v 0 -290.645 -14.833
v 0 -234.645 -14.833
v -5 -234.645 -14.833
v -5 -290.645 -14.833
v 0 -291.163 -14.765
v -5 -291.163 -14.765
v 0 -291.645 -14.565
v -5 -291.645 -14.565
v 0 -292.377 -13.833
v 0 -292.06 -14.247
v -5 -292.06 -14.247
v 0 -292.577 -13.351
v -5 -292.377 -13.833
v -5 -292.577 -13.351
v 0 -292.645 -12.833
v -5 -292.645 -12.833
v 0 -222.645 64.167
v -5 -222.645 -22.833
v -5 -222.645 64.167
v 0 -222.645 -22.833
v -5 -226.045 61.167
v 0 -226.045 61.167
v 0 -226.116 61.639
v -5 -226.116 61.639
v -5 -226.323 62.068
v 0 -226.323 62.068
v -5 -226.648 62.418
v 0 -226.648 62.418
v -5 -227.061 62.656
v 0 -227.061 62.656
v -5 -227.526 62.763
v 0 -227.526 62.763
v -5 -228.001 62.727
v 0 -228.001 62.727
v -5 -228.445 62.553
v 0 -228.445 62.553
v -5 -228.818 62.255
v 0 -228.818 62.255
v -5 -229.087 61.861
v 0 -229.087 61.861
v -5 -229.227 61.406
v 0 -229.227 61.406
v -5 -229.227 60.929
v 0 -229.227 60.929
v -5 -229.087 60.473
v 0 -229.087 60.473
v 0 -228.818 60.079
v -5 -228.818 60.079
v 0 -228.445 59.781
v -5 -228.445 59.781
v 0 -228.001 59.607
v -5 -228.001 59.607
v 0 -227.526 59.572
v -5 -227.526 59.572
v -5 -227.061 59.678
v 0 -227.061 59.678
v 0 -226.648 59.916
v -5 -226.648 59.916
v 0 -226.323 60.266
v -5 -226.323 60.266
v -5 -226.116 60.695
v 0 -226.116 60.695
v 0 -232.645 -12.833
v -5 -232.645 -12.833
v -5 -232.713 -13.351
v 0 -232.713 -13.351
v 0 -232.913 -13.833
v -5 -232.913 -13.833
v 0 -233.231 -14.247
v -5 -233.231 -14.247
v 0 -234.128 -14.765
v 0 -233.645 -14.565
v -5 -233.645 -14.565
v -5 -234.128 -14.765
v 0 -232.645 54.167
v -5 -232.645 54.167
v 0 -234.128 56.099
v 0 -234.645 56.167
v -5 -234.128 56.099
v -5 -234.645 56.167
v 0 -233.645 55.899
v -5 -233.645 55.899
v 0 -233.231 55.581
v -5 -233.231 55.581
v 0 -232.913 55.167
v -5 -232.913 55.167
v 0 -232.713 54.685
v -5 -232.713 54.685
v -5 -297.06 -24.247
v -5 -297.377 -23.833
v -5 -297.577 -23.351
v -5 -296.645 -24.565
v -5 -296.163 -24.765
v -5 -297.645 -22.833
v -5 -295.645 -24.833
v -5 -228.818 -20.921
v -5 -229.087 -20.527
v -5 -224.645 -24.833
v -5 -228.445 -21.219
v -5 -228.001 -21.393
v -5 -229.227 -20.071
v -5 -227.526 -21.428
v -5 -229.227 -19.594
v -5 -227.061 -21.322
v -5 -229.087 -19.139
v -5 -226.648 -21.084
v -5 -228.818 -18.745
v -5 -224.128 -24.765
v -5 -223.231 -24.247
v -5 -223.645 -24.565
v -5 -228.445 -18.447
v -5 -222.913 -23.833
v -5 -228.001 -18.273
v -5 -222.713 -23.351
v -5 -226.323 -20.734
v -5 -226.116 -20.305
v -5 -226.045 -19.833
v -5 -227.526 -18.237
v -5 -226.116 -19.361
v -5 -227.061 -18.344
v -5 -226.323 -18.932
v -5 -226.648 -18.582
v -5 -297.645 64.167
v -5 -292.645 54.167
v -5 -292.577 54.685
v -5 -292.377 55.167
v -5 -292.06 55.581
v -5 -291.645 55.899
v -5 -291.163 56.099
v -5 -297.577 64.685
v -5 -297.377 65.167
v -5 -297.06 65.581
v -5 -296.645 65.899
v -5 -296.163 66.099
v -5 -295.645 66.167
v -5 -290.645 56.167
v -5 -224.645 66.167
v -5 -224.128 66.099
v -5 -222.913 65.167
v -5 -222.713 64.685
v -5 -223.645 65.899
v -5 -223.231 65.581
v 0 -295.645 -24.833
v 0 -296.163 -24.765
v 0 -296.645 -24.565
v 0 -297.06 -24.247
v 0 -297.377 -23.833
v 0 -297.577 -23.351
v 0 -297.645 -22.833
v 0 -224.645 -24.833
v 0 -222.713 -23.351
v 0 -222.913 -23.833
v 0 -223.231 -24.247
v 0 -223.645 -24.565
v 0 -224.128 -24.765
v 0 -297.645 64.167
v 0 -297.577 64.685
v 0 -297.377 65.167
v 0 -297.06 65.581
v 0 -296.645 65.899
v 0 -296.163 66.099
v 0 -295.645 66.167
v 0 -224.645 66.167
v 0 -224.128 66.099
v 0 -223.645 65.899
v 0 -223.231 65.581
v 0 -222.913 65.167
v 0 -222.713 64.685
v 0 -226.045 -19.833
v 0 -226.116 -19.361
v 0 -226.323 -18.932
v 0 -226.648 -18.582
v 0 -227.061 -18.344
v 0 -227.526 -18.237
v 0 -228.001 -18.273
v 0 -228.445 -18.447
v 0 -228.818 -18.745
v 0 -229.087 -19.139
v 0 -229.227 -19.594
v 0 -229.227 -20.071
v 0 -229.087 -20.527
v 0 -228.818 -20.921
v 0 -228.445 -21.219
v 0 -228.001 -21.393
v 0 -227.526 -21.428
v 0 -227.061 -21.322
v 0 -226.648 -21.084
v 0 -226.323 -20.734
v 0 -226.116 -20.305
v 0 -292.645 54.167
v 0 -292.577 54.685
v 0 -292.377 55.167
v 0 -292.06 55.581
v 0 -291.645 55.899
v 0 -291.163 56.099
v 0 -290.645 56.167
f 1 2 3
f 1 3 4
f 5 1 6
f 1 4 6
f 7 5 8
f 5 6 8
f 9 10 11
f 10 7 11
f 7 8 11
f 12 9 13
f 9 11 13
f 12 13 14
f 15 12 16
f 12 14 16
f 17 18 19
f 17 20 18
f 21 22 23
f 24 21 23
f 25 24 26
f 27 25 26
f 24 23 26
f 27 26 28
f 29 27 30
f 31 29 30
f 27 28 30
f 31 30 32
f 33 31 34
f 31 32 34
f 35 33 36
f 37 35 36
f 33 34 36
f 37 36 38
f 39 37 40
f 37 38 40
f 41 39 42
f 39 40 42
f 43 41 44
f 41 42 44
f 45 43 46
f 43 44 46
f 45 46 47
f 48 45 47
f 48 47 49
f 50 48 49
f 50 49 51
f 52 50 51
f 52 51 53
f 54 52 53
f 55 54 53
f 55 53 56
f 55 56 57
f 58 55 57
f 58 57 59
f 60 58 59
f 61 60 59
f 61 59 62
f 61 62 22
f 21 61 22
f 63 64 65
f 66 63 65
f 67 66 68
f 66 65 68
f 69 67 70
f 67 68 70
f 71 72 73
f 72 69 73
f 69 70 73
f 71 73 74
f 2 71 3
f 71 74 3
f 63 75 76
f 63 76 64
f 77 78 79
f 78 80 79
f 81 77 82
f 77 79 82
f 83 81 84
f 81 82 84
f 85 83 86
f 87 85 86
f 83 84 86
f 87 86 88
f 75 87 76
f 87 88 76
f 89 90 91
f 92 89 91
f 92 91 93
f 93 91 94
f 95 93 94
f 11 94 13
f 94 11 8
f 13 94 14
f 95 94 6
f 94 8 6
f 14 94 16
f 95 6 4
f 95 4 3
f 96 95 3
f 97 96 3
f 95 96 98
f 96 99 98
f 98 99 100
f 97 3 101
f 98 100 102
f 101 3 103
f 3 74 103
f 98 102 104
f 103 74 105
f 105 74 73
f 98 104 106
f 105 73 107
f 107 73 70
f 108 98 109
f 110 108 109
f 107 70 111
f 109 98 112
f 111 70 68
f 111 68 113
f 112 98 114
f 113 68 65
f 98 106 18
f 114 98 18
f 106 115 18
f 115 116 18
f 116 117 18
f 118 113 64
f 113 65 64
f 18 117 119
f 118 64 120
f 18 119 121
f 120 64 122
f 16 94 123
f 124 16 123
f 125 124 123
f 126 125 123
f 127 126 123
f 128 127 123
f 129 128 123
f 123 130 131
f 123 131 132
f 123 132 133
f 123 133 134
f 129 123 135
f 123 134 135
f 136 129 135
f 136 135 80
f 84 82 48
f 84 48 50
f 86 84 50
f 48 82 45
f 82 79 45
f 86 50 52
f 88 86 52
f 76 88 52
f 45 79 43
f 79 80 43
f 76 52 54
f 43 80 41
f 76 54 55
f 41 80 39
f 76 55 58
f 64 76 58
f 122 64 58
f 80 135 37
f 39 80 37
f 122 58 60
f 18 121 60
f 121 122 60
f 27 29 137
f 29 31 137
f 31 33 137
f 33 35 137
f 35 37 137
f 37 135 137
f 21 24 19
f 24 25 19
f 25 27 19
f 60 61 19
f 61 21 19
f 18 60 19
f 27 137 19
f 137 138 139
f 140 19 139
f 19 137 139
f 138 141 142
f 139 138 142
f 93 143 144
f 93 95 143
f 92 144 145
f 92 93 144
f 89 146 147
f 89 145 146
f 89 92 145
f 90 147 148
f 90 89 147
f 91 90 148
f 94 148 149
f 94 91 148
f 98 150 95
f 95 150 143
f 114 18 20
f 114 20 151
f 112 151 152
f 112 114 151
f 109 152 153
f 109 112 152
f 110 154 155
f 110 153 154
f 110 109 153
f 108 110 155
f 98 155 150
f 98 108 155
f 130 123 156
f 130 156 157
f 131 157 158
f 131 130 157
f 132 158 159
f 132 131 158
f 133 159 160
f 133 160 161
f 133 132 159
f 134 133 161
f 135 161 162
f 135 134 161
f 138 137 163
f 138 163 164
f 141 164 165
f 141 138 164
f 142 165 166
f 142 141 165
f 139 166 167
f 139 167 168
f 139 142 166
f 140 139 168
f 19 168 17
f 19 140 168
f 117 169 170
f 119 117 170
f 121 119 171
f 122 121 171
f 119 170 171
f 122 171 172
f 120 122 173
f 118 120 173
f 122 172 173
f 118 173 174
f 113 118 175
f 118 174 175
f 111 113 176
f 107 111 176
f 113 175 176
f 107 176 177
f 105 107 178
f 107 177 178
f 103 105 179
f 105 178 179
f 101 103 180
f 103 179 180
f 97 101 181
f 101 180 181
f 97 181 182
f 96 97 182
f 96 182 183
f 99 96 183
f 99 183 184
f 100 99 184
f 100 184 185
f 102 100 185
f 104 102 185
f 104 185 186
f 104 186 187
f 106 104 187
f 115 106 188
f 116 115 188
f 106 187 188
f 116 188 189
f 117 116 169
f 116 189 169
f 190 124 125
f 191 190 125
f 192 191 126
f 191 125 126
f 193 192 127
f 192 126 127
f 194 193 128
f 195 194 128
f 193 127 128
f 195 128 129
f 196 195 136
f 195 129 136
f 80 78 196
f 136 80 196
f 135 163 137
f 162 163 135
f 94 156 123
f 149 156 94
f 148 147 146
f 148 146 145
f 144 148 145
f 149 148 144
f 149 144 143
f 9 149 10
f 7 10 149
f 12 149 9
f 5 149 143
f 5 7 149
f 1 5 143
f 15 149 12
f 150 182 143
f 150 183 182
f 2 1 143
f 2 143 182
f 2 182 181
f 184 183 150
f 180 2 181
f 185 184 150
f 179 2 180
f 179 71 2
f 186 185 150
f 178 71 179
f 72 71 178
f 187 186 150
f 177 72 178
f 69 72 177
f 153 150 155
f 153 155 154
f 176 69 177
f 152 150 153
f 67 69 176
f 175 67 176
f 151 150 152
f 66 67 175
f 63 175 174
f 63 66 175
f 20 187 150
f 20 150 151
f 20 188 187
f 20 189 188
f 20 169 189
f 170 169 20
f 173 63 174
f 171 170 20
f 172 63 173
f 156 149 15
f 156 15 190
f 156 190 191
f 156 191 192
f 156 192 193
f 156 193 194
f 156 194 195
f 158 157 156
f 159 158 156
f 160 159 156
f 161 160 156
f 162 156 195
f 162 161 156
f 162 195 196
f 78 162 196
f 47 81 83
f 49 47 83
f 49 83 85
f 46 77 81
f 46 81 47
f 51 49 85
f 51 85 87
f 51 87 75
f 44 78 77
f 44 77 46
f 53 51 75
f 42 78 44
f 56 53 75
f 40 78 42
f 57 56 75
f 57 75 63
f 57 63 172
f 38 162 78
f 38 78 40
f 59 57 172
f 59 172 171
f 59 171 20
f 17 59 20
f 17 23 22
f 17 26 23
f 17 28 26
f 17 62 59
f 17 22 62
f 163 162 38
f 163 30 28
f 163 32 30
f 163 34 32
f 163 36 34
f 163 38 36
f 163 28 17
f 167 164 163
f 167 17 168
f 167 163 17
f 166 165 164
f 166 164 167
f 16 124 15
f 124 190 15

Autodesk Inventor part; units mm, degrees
ref_plane "YZ Plane" through (0, 0, 0) normal (1, 0, 0) x (0, 1, 0)
ref_plane "XZ Plane" through (0, 0, 0) normal (0, 1, 0) x (-1, 0, 0)
ref_plane "XY Plane" through (0, 0, 0) normal (0, 0, 1) x (1, 0, 0)
sketch "スケッチ1" plane through (0, 0, 0) normal (1, 0, 0) x (0, 1, 0)
  line L0 (-222.6453, 335.6671) -> (407.3547, 335.6671)
  line L1 (407.3547, 335.6671) -> (407.3547, -294.3329)
  line L2 (407.3547, -294.3329) -> (-222.6453, -294.3329)
  line L3 (-222.6453, -294.3329) -> (-222.6453, 335.6671)
  line L4 (-222.6453, 335.6671) -> (407.3547, -294.3329) construction
  line L5 (407.3547, 335.6671) -> (-222.6453, -294.3329) construction
  line L6 (-202.6453, 238.6671) -> (-202.6453, -181.3329)
  line L7 (-202.6453, -181.3329) -> (-222.6453, -181.3329)
  line L8 (-222.6453, -181.3329) -> (-222.6453, 230.6671)
  line L9 (334.3547, 335.6671) -> (-149.6453, 335.6671)
  line L10 (-149.6453, 335.6671) -> (-149.6453, 315.6671)
  line L11 (-149.6453, 315.6671) -> (334.3547, 315.6671)
  line L12 (334.3547, 315.6671) -> (334.3547, 335.6671)
  line L13 (-202.6453, 238.6671) -> (-202.6453, 335.6671)
  line L14 (92.3547, 20.6671) -> (-864.2426, 20.6671)
  circle A0 centre (92.3547, 20.6671) radius 400
  line L15 (-237.6453, 45.6671) -> (-287.6453, 45.6671)
  line L16 (-287.6453, 45.6671) -> (-287.6453, -4.3329)
  line L17 (-287.6453, -4.3329) -> (-237.6453, -4.3329)
  line L18 (-237.6453, -4.3329) -> (-237.6453, 45.6671)
  line L19 (92.3547, 20.6671) -> (92.3547, -610.2507)
  line L20 (-222.6453, 60.6671) -> (-302.6453, 60.6671) construction
  line L21 (-302.6453, 60.6671) -> (-302.6453, 50.6671)
  line L22 (-302.6453, 50.6671) -> (-222.6453, 50.6671)
  line L23 (-222.6453, 50.6671) -> (-222.6453, 60.6671)
  line L24 (-302.6453, 50.6671) -> (-292.6453, 50.6671)
  line L25 (-292.6453, 50.6671) -> (-292.6453, 20.6671)
  line L26 (-292.6453, 20.6671) -> (-302.6453, 20.6671)
  line L27 (-302.6453, 20.6671) -> (-302.6453, 50.6671)
  line L28 (387.3547, 222.6671) -> (407.3547, 222.6671)
  line L29 (407.3547, 222.6671) -> (407.3547, -181.3329)
  line L30 (407.3547, -181.3329) -> (387.3547, -181.3329)
  line L31 (387.3547, -181.3329) -> (387.3547, 222.6671)
  line L32 (-129.8635, -294.3329) -> (334.3547, -294.3329)
  line L33 (334.3547, -294.3329) -> (334.3547, -274.3329)
  line L34 (334.3547, -274.3329) -> (-149.6453, -274.3329)
  line L35 (407.3547, 335.6671) -> (92.3547, 20.6671)
  line L36 (407.3547, 145.6671) -> (407.3547, 165.6671)
  circle A1 centre (604.3547, 20.6671) radius 122.5
  circle A2 centre (272.0452, 20.6671) radius 600
  circle A3 centre (634.0363, 20.6671) radius 200
  circle A4 centre (92.3547, 20.6671) radius 10
  arc A5 (92.3547, 170.6671) -> (92.3547, -129.3329) centre (92.3547, 20.6671) ccw
  arc A6 (92.3547, 160.6671) -> (92.3547, -119.3329) centre (92.3547, 20.6671) ccw
  line L37 (-53.9724, 53.6575) -> (-44.2173, 51.4581)
  line L38 (-45.2265, 58.3488) -> (-48.0856, 45.6671)
  line L39 (-48.0856, 45.6671) -> (-52.9632, 46.7668)
  line L40 (-52.9632, 46.7668) -> (-50.104, 59.4485)
  line L41 (-50.104, 59.4485) -> (-45.2265, 58.3488)
  arc A7 (63.2246, 162.7109) -> (63.2246, -121.3767) centre (92.3547, 20.6671) ccw
  circle A8 centre (-59.1356, 59.9471) radius 6.5
  circle A9 centre (-36.6854, 54.8855) radius 6.5 construction
  circle A10 centre (-36.6854, 54.8855) radius 1.5 construction
  circle A11 centre (-59.1356, 59.9471) radius 1.5
  line L42 (62.1879, 43.1671) -> (-81.7815, 43.1671)
  line L43 (-81.7815, 43.1671) -> (-81.7815, 28.1671)
  line L44 (-81.7815, 28.1671) -> (62.1879, 28.1671)
  line L45 (62.1879, 28.1671) -> (62.1879, 43.1671)
  line L46 (-53.9724, -12.3232) -> (-44.2173, -10.1239)
  line L47 (-45.2265, -17.0146) -> (-48.0856, -4.3329)
  line L48 (-48.0856, -4.3329) -> (-52.9632, -5.4326)
  line L49 (-52.9632, -5.4326) -> (-50.104, -18.1142)
  line L50 (-50.104, -18.1142) -> (-45.2265, -17.0146)
  circle A12 centre (-59.1356, -18.6128) radius 6.5
  circle A13 centre (-36.6854, -13.5513) radius 6.5 construction
  circle A14 centre (-36.6854, -13.5513) radius 1.5 construction
  circle A15 centre (-59.1356, -18.6128) radius 1.5
  line L51 (62.1879, -1.8329) -> (-81.7815, -1.8329)
  line L52 (-81.7815, -1.8329) -> (-81.7815, 13.1671)
  line L53 (-81.7815, 13.1671) -> (62.1879, 13.1671)
  line L54 (62.1879, 13.1671) -> (62.1879, -1.8329)
  line L55 (-59.1356, 59.9471) -> (-36.6854, 54.8855) construction
  line L56 (-36.6854, 54.8855) -> (-37.2352, 52.4467) construction
  line L57 (-37.2352, 52.4467) -> (-59.6855, 57.5083) construction
  line L58 (-59.6855, 57.5083) -> (-59.1356, 59.9471) construction
  line L59 (-36.6854, 54.8855) -> (-59.1356, 59.9471) construction
  line L60 (-59.1356, 59.9471) -> (-58.5858, 62.3858) construction
  line L61 (-58.5858, 62.3858) -> (-36.1355, 57.3243) construction
  line L62 (-36.1355, 57.3243) -> (-36.6854, 54.8855) construction
  line L63 (-36.1355, 57.3243) -> (-37.2352, 52.4467) construction
  line L64 (-37.2352, 52.4467) -> (-25.529, 49.8075) construction
  line L65 (-25.529, 49.8075) -> (-24.4294, 54.6851) construction
  line L66 (-24.4294, 54.6851) -> (-36.1355, 57.3243) construction
  line L67 (-58.5858, 62.3858) -> (-59.6855, 57.5083) construction
  line L68 (-59.6855, 57.5083) -> (-71.3917, 60.1475) construction
  line L69 (-71.3917, 60.1475) -> (-70.292, 65.0251) construction
  line L70 (-70.292, 65.0251) -> (-58.5858, 62.3858) construction
  line L71 (-62.9135, 65.9243) -> (-36.5865, 59.9887)
  line L72 (-36.5865, 59.9887) -> (-39.8855, 45.356)
  line L73 (-39.8855, 45.356) -> (-66.2126, 51.2916)
  line L74 (-66.2126, 51.2916) -> (-62.9135, 65.9243)
  line L75 (-62.9135, -24.5901) -> (-36.5865, -18.6545)
  line L76 (-36.5865, -18.6545) -> (-39.8855, -4.0218)
  line L77 (-39.8855, -4.0218) -> (-66.2126, -9.9574)
  line L78 (-66.2126, -9.9574) -> (-62.9135, -24.5901)
  arc A16 (-39.8855, 45.356) -> (-39.8855, -4.0218) centre (92.3547, 20.6671) ccw
  arc A17 (-66.2126, 51.2916) -> (-66.2126, -9.9574) centre (92.3547, 20.6671) ccw
  circle A18 centre (-60.1453, 35.6671) radius 1.25
  line L79 (-52.6453, 20.6671) -> (-52.6453, 95.4053)
  circle A19 centre (-45.1453, 35.6671) radius 1.25
  circle A20 centre (-60.1453, 5.6671) radius 1.25
  circle A21 centre (-45.1453, 5.6671) radius 1.25
  line L80 (92.3547, 20.6671) -> (92.3547, 160.6671)
  line L81 (92.3547, 20.6671) -> (44.4719, 152.2241)
  line L82 (92.3547, 160.6671) -> (92.3547, 170.6671)
  line L83 (-45.2298, 46.5609) -> (-41.9308, 61.1936)
  line L84 (-45.2298, -5.2267) -> (-41.9308, -19.8594)
  circle A22 centre (92.3547, 20.6671) radius 20
  line L85 (387.3547, 65.6671) -> (-202.6453, 65.6671)
  line L86 (-202.6453, 65.6671) -> (-202.6453, 45.6671)
  line L87 (-202.6453, 45.6671) -> (387.3547, 45.6671)
  line L88 (387.3547, 45.6671) -> (387.3547, 65.6671)
  line L89 (52.3547, 315.6671) -> (42.3547, 315.6671)
  line L90 (42.3547, 315.6671) -> (42.3547, 65.6671)
  line L91 (42.3547, 65.6671) -> (52.3547, 65.6671)
  line L92 (52.3547, 65.6671) -> (52.3547, 315.6671)
  line L93 (387.3547, -24.3329) -> (-202.6453, -24.3329)
  line L94 (-202.6453, -4.3329) -> (387.3547, -4.3329)
  line L95 (42.3547, -274.3329) -> (42.3547, -24.3329)
  line L96 (52.3547, -24.3329) -> (52.3547, -274.3329)
  line L97 (52.3547, 65.6671) -> (52.3547, -24.3329)
  line L98 (132.3547, 65.6671) -> (132.3547, -24.3329)
  circle A23 centre (112.3547, 55.6671) radius 1.5
  circle A24 centre (72.3547, 55.6671) radius 1.5
  circle A25 centre (112.3547, -14.3329) radius 1.5
  circle A26 centre (72.3547, -14.3329) radius 1.5
  circle A27 centre (47.3547, 145.6671) radius 1.5
  circle A28 centre (47.3547, 145.6671) radius 5
  circle A29 centre (-37.6453, 55.6671) radius 5
  circle A30 centre (-37.6453, 55.6671) radius 1.5
  line L99 (52.3547, 154.8312) -> (52.3547, 145.6671)
  line L100 (42.3547, 145.6671) -> (42.3547, 151.4341)
  line L101 (-45.395, 45.6671) -> (-35.2253, 51.2917)
  line L102 (-40.216, 65.6671) -> (-34.0112, 59.1013)
  circle A31 centre (47.3547, -104.3329) radius 1.5
  circle A32 centre (47.3547, -104.3329) radius 5
  circle A33 centre (-37.6453, -14.3329) radius 5
  circle A34 centre (-37.6453, -14.3329) radius 1.5
  line L103 (52.3547, -113.497) -> (52.3547, -104.3329)
  line L104 (42.3547, -104.3329) -> (42.3547, -110.0999)
  line L105 (-45.395, -4.3329) -> (-35.2253, -9.9575)
  line L106 (-40.216, -24.3329) -> (-34.0112, -17.7671)
  line L107 (-149.6453, -274.3329) -> (-149.6453, -294.3329)
  line L108 (334.3547, 335.6671) -> (314.3547, 335.6671)
  line L109 (314.3547, 335.6671) -> (314.3547, 315.6671)
  line L110 (314.3547, 315.6671) -> (334.3547, 315.6671)
  line L111 (334.3547, 315.6671) -> (334.3547, 335.6671)
  line L112 (334.3547, -294.3329) -> (314.3547, -294.3329)
  line L113 (314.3547, -294.3329) -> (314.3547, -274.3329)
  line L114 (314.3547, -274.3329) -> (334.3547, -274.3329)
  line L115 (334.3547, -274.3329) -> (334.3547, -294.3329)
  line L116 (289.3547, 315.6671) -> (387.3547, 217.6671)
  line L117 (387.3547, 217.6671) -> (376.7481, 207.0605)
  line L118 (376.7481, 207.0605) -> (278.7481, 305.0605)
  line L119 (278.7481, 305.0605) -> (289.3547, 315.6671)
  line L120 (289.3547, 315.6671) -> (289.3547, 335.6671)
  line L121 (290.2715, 314.7504) -> (279.6649, 304.1438)
  line L122 (290.625, 293.1836) -> (364.8712, 218.9374)
  line L123 (364.8712, 218.9374) -> (323.8591, 177.9252)
  line L124 (323.8591, 177.9252) -> (249.6128, 252.1714)
  line L125 (249.6128, 252.1714) -> (290.625, 293.1836)
  line L126 (383.256, 221.7658) -> (372.6494, 211.1592)
  line L127 (186.1172, 315.6671) -> (387.3547, 114.4295)
  line L128 (387.3547, 114.4295) -> (376.7481, 103.8229)
  line L129 (376.7481, 103.8229) -> (175.5105, 305.0605)
  line L130 (306.5349, 298.4869) -> (295.9283, 287.8803)
  line L131 (370.1745, 234.8473) -> (359.5679, 224.2407)
  circle A35 centre (292.0392, 302.376) radius 1.5
  circle A36 centre (306.1814, 288.2339) radius 1.5
  line L132 (278.7481, 305.0605) -> (268.1415, 315.6671)
  circle A37 centre (279.3547, 325.6671) radius 1.5
  circle A38 centre (269.3547, 325.6671) radius 1.5
  line L133 (264.3547, 335.6671) -> (264.3547, 315.6671)
  line L134 (186.1172, 315.6671) -> (186.1172, 315.6671)
  line L135 (186.1172, 315.6671) -> (186.1172, 335.6671)
  line L136 (175.5105, 305.0605) -> (164.9039, 315.6671)
  line L137 (161.1172, 335.6671) -> (161.1172, 315.6671)
  line L138 (376.7481, 207.0605) -> (387.3547, 196.4539)
  line L139 (387.3547, 217.6671) -> (407.3547, 217.6671)
  line L140 (387.3547, 114.4295) -> (387.3547, 114.4295)
  line L141 (376.7481, 103.8229) -> (387.3547, 93.2163)
  line L142 (-104.6453, 315.6671) -> (-202.6453, 217.6671)
  line L143 (-192.0387, 207.0605) -> (-94.0387, 305.0605)
  line L144 (-104.6453, 315.6671) -> (-104.6453, 335.6671)
  line L145 (-105.562, 314.7504) -> (-94.9554, 304.1438)
  line L146 (-180.1618, 218.9374) -> (-139.1496, 177.9252)
  line L147 (-64.9034, 252.1714) -> (-105.9156, 293.1836)
  line L148 (-198.5465, 221.7658) -> (-187.9399, 211.1592)
  line L149 (-1.4077, 315.6671) -> (-202.6453, 114.4295)
  line L150 (-202.6453, 114.4295) -> (-192.0387, 103.8229)
  line L151 (-192.0387, 103.8229) -> (9.1989, 305.0605)
  line L152 (9.1989, 305.0605) -> (-1.4077, 315.6671)
  line L153 (-121.8255, 298.4869) -> (-111.2189, 287.8803)
  line L154 (-94.0387, 305.0605) -> (-83.4321, 315.6671)
  line L155 (-79.6453, 335.6671) -> (-79.6453, 315.6671)
  line L156 (-1.4077, 315.6671) -> (-1.4077, 335.6671)
  line L157 (9.1989, 305.0605) -> (19.8055, 315.6671)
  line L158 (23.5923, 335.6671) -> (23.5923, 315.6671)
  line L159 (-192.0387, 207.0605) -> (-202.6453, 196.4539)
  line L160 (-202.6453, 217.6671) -> (-222.6453, 217.6671)
  line L161 (-192.0387, 103.8229) -> (-202.6453, 93.2163)
  line L162 (289.3547, -274.3329) -> (387.3547, -176.3329)
  line L163 (376.7481, -165.7263) -> (278.7481, -263.7263)
  line L164 (290.2715, -273.4161) -> (279.6649, -262.8095)
  line L165 (383.256, -180.4316) -> (372.6494, -169.825)
  line L166 (186.1172, -274.3329) -> (387.3547, -73.0953)
  line L167 (387.3547, -73.0953) -> (376.7481, -62.4887)
  line L168 (376.7481, -62.4887) -> (175.5105, -263.7263)
  line L169 (175.5105, -263.7263) -> (186.1172, -274.3329)
  line L170 (-1.4077, -274.3329) -> (-202.6453, -73.0953)
  line L171 (9.1989, -263.7263) -> (-1.4077, -274.3329)
  line L172 (-192.0387, -62.4887) -> (9.1989, -263.7263)
  line L173 (-202.6453, -73.0953) -> (-192.0387, -62.4887)
  line L174 (-192.0387, -165.7263) -> (-94.0387, -263.7263)
  line L175 (-104.6453, -274.3329) -> (-202.6453, -176.3329)
  line L176 (-105.562, -273.4161) -> (-94.9554, -262.8095)
  line L177 (-121.8255, -257.1527) -> (-111.2189, -246.5461)
  line L178 (-198.5465, -180.4316) -> (-187.9399, -169.825)
  line L179 (334.3547, 315.6671) -> (314.3547, 315.6671)
  arc A39 (92.3547, 106.6671) -> (92.3547, -65.3329) centre (92.3547, 20.6671) ccw construction
  circle A40 centre (1.4881, 69.1671) radius 21
  circle A41 centre (92.3547, 20.6671) radius 124
  circle A42 centre (1.4881, 69.1671) radius 17
  arc A43 (132.8499, 96.5364) -> (92.3547, 106.6671) centre (92.3547, 20.6671) ccw construction
  line L180 (52.3547, 65.6671) -> (42.3547, 65.6671)
  line L181 (42.3547, 65.6671) -> (42.3547, -24.3329)
  line L182 (42.3547, -24.3329) -> (52.3547, -24.3329)
  line L183 (52.3547, -24.3329) -> (52.3547, 65.6671)
  line L184 (52.3547, 315.6671) -> (42.3547, 315.6671)
  line L185 (42.3547, 315.6671) -> (42.3547, 335.6671)
  line L186 (42.3547, 335.6671) -> (52.3547, 335.6671)
  line L187 (52.3547, 335.6671) -> (52.3547, 315.6671)
  line L188 (52.3547, -274.3329) -> (42.3547, -274.3329)
  line L189 (42.3547, -274.3329) -> (42.3547, -294.3329)
  line L190 (42.3547, -294.3329) -> (52.3547, -294.3329)
  line L191 (52.3547, -294.3329) -> (52.3547, -274.3329)
  line L192 (142.3547, 315.6671) -> (142.3547, 65.6671)
  line L193 (132.3547, 65.6671) -> (132.3547, 315.6671)
  line L194 (142.3547, -274.3329) -> (142.3547, -24.3329)
  line L195 (132.3547, -24.3329) -> (132.3547, -274.3329)
  line L196 (142.3547, 65.6671) -> (142.3547, -24.3329)
  line L197 (132.3547, -24.3329) -> (132.3547, 65.6671)
  line L198 (142.3547, 315.6671) -> (142.3547, 335.6671)
  line L199 (132.3547, 335.6671) -> (132.3547, 315.6671)
  line L200 (142.3547, -274.3329) -> (142.3547, -294.3329)
  line L201 (132.3547, -294.3329) -> (132.3547, -274.3329)
  line L202 (51.9456, 143.6861) -> (57.3547, 156.2215)
  line L203 (43.613, 142.3505) -> (37.3547, 149.411)
  line L204 (51.9456, -102.3519) -> (57.3547, -114.8873)
  line L205 (43.613, -101.0163) -> (37.3547, -108.0768)
  arc A44 (132.8499, 96.5364) -> (51.8596, -55.2021) centre (92.3547, 20.6671) ccw
  circle A45 centre (92.3547, 20.6671) radius 86 construction
  circle A46 centre (92.3547, 20.6671) radius 78.5
  circle A47 centre (47.3547, 78.6671) radius 1.5
  circle A48 centre (47.3547, 78.6671) radius 5
  circle A49 centre (137.3547, 78.6671) radius 5
  circle A50 centre (137.3547, 78.6671) radius 1.5
  line L206 (138.9096, 73.915) -> (147.3547, 76.6783)
  line L207 (132.6797, 76.8939) -> (127.3547, 90.9327)
  line L208 (142.3547, 81.1836) -> (142.3547, 90.6385)
  arc A51 (142.3547, 90.6385) -> (132.8499, 96.5364) centre (92.3547, 20.6671) ccw
  line L209 (52.0297, 76.8939) -> (57.3547, 90.9327)
  line L210 (45.7999, 73.915) -> (37.3547, 76.6783)
  circle A52 centre (47.3547, -37.3329) radius 1.5
  circle A53 centre (47.3547, -37.3329) radius 5
  line L211 (52.0297, -35.5596) -> (57.3547, -49.5985) construction
  line L212 (45.7999, -32.5808) -> (37.3547, -35.344)
  line L213 (52.3547, -46.8773) -> (52.3547, -55.4643)
  arc A54 (51.8288, -55.1857) -> (52.3547, -55.4643) centre (92.3547, 20.6671) ccw
  line L214 (52.3547, -55.4643) -> (52.3547, -37.3329)
  line L215 (315.0202, 290.0016) -> (304.4136, 279.395)
  line L216 (387.3547, 217.6671) -> (407.3547, 217.6671)
  line L217 (386.438, 218.5839) -> (375.8314, 207.9773)
  circle A55 centre (374.0636, 220.3516) radius 1.5
  circle A56 centre (359.9215, 234.4938) radius 1.5
  circle A57 centre (397.3547, 207.6671) radius 1.5
  circle A58 centre (397.3547, 197.6671) radius 1.5
  line L218 (407.3547, 192.6671) -> (387.3547, 192.6671)
  line L219 (361.6893, 243.3326) -> (351.0827, 232.726)
  circle A59 centre (176.1172, 325.6671) radius 1.5
  circle A60 centre (166.1172, 325.6671) radius 1.5
  line L220 (290.2715, 314.7504) -> (187.0339, 314.7504)
  line L221 (279.6649, 304.1438) -> (176.4273, 304.1438)
  line L222 (187.0339, 314.7504) -> (176.4273, 304.1438)
  circle A61 centre (188.8017, 302.376) radius 1.5
  circle A62 centre (202.9438, 288.2339) radius 1.5
  line L223 (211.7826, 290.0016) -> (201.176, 279.395)
  line L224 (387.3547, 114.4295) -> (407.3547, 114.4295)
  line L225 (407.3547, 89.4295) -> (387.3547, 89.4295)
  circle A63 centre (397.3547, 104.4295) radius 1.5
  circle A64 centre (397.3547, 94.4295) radius 1.5
  line L226 (386.438, 115.3463) -> (375.8314, 104.7397)
  circle A65 centre (374.0636, 117.114) radius 1.5
  circle A66 centre (359.9215, 131.2562) radius 1.5
  line L227 (361.6893, 140.095) -> (351.0827, 129.4884)
  line L228 (-104.6453, 315.6671) -> (-104.6453, 335.6671)
  line L229 (-105.562, 314.7504) -> (-94.9554, 304.1438)
  line L230 (-121.8255, 298.4869) -> (-111.2189, 287.8803)
  circle A67 centre (-107.3298, 302.376) radius 1.5
  circle A68 centre (-121.4719, 288.2339) radius 1.5
  circle A69 centre (-94.6453, 325.6671) radius 1.5
  circle A70 centre (-84.6453, 325.6671) radius 1.5
  line L231 (-79.6453, 335.6671) -> (-79.6453, 315.6671)
  line L232 (-1.4077, 315.6671) -> (-1.4077, 335.6671)
  line L233 (23.5923, 335.6671) -> (23.5923, 315.6671)
  line L234 (-202.6453, 217.6671) -> (-222.6453, 217.6671)
  line L235 (-130.3107, 290.0016) -> (-119.7041, 279.395)
  line L236 (-176.9798, 243.3326) -> (-166.3732, 232.726)
  circle A71 centre (-175.212, 234.4938) radius 1.5
  circle A72 centre (-189.3542, 220.3516) radius 1.5
  line L237 (-201.7285, 218.5839) -> (-191.1219, 207.9773)
  line L238 (-222.6453, 192.6671) -> (-202.6453, 192.6671)
  circle A73 centre (-212.6453, 197.6671) radius 1.5
  circle A74 centre (-212.6453, 207.6671) radius 1.5
  circle A75 centre (8.5923, 325.6671) radius 1.5
  circle A76 centre (18.5923, 325.6671) radius 1.5
  line L239 (-2.3244, 314.7504) -> (8.2822, 304.1438)
  circle A77 centre (-4.0922, 302.376) radius 1.5
  circle A78 centre (-18.2343, 288.2339) radius 1.5
  line L240 (-27.0731, 290.0016) -> (-16.4665, 279.395)
  line L241 (-202.6453, 114.4295) -> (-222.6453, 114.4295)
  line L242 (-222.6453, 89.4295) -> (-202.6453, 89.4295)
  circle A79 centre (-212.6453, 94.4295) radius 1.5
  circle A80 centre (-212.6453, 104.4295) radius 1.5
  line L243 (-201.7285, 115.3463) -> (-191.1219, 104.7397)
  circle A81 centre (-189.3542, 117.114) radius 1.5
  circle A82 centre (-175.212, 131.2562) radius 1.5
  line L244 (-176.9798, 140.095) -> (-166.3732, 129.4884)
  line L245 (289.3547, -274.3329) -> (289.3547, -294.3329)
  line L246 (290.2715, -273.4161) -> (279.6649, -262.8095)
  circle A83 centre (292.0392, -261.0418) radius 1.5
  circle A84 centre (306.1814, -246.8996) radius 1.5
  circle A85 centre (279.3547, -284.3329) radius 1.5
  circle A86 centre (269.3547, -284.3329) radius 1.5
  line L247 (264.3547, -294.3329) -> (264.3547, -274.3329)
  line L248 (186.1172, -274.3329) -> (186.1172, -294.3329)
  line L249 (161.1172, -294.3329) -> (161.1172, -274.3329)
  line L250 (387.3547, -176.3329) -> (407.3547, -176.3329)
  line L251 (-104.6453, -274.3329) -> (-104.6453, -294.3329)
  line L252 (-79.6453, -294.3329) -> (-79.6453, -274.3329)
  line L253 (23.5923, -294.3329) -> (23.5923, -274.3329)
  line L254 (-105.562, -273.4161) -> (-94.9554, -262.8095)
  line L255 (-202.6453, -176.3329) -> (-222.6453, -176.3329)
  line L256 (315.0202, -248.6674) -> (304.4136, -238.0608)
  line L257 (361.6893, -201.9984) -> (351.0827, -191.3918)
  circle A87 centre (359.9215, -193.1595) radius 1.5
  circle A88 centre (374.0636, -179.0174) radius 1.5
  line L258 (386.438, -177.2496) -> (375.8314, -166.643)
  line L259 (407.3547, -151.3329) -> (387.3547, -151.3329)
  circle A89 centre (397.3547, -156.3329) radius 1.5
  circle A90 centre (397.3547, -166.3329) radius 1.5
  circle A91 centre (176.1172, -284.3329) radius 1.5
  circle A92 centre (166.1172, -284.3329) radius 1.5
  line L260 (187.0339, -273.4161) -> (176.4273, -262.8095)
  circle A93 centre (188.8017, -261.0418) radius 1.5
  circle A94 centre (202.9438, -246.8996) radius 1.5
  line L261 (211.7826, -248.6674) -> (201.176, -238.0608)
  line L262 (387.3547, -73.0953) -> (407.3547, -73.0953)
  line L263 (407.3547, -48.0953) -> (387.3547, -48.0953)
  circle A95 centre (397.3547, -53.0953) radius 1.5
  circle A96 centre (397.3547, -63.0953) radius 1.5
  line L264 (386.438, -74.012) -> (375.8314, -63.4054)
  circle A97 centre (374.0636, -75.7798) radius 1.5
  circle A98 centre (359.9215, -89.9219) radius 1.5
  line L265 (361.6893, -98.7608) -> (351.0827, -88.1542)
  circle A99 centre (-84.6453, -284.3329) radius 1.5
  circle A100 centre (-94.6453, -284.3329) radius 1.5
  circle A101 centre (-107.3298, -261.0418) radius 1.5
  circle A102 centre (-121.4719, -246.8996) radius 1.5
  line L266 (-130.3107, -248.6674) -> (-119.7041, -238.0608)
  circle A103 centre (-175.212, -193.1595) radius 1.5
  line L267 (-176.9798, -201.9984) -> (-166.3732, -191.3918)
  circle A104 centre (-189.3542, -179.0174) radius 1.5
  line L268 (-201.7285, -177.2496) -> (-191.1219, -166.643)
  circle A105 centre (-212.6453, -166.3329) radius 1.5
  circle A106 centre (-212.6453, -156.3329) radius 1.5
  line L269 (-222.6453, -151.3329) -> (-202.6453, -151.3329)
  line L270 (-202.6453, -73.0953) -> (-222.6453, -73.0953)
  line L271 (-222.6453, -48.0953) -> (-202.6453, -48.0953)
  circle A107 centre (-212.6453, -53.0953) radius 1.5
  circle A108 centre (-212.6453, -63.0953) radius 1.5
  line L272 (-201.7285, -74.012) -> (-191.1219, -63.4054)
  circle A109 centre (-189.3542, -75.7798) radius 1.5
  circle A110 centre (-175.212, -89.9219) radius 1.5
  line L273 (-176.9798, -98.7608) -> (-166.3732, -88.1542)
  line L274 (-27.0731, -248.6674) -> (-16.4665, -238.0608)
  circle A111 centre (-18.2343, -246.8996) radius 1.5
  circle A112 centre (-4.0922, -261.0418) radius 1.5
  line L275 (-2.3244, -273.4161) -> (8.2822, -262.8095)
  line L276 (-1.4077, -274.3329) -> (-1.4077, -294.3329)
  circle A113 centre (18.5923, -284.3329) radius 1.5
  circle A114 centre (8.5923, -284.3329) radius 1.5
  line L277 (-202.6453, 222.6671) -> (-222.6453, 222.6671)
  line L278 (357.3547, 65.6671) -> (357.3547, 45.6671)
  circle A115 centre (367.3547, 55.6671) radius 1.5
  circle A116 centre (377.3547, 55.6671) radius 1.5
  circle A117 centre (397.3547, 55.6671) radius 1.5
  circle A118 centre (397.3547, 45.6671) radius 1.5
  line L279 (387.3547, 45.6671) -> (407.3547, 45.6671)
  line L280 (357.3547, -24.3329) -> (357.3547, -4.3329)
  circle A119 centre (367.3547, -14.3329) radius 1.5
  circle A120 centre (377.3547, -14.3329) radius 1.5
  circle A121 centre (397.3547, -14.3329) radius 1.5
  circle A122 centre (397.3547, -4.3329) radius 1.5
  line L281 (-172.6453, 65.6671) -> (-172.6453, 45.6671)
  circle A123 centre (-182.6453, 55.6671) radius 1.5
  circle A124 centre (-192.6453, 55.6671) radius 1.5
  circle A125 centre (-212.6453, 55.6671) radius 1.5
  circle A126 centre (-212.6453, 45.6671) radius 1.5
  line L282 (-172.6453, -24.3329) -> (-172.6453, -4.3329)
  circle A127 centre (-182.6453, -14.3329) radius 1.5
  circle A128 centre (-192.6453, -14.3329) radius 1.5
  circle A129 centre (-212.6453, -14.3329) radius 1.5
  circle A130 centre (-212.6453, -4.3329) radius 1.5
  circle A131 centre (140.3547, 365.6671) radius 44
  circle A132 centre (42.3547, 365.6671) radius 44
  circle A133 centre (42.3547, 365.6671) radius 15
  line L283 (387.3547, 65.6671) -> (407.3547, 65.6671)
  line L284 (387.3547, 35.6671) -> (407.3547, 35.6671)
  line L285 (-222.6453, 66.1671) -> (-297.6453, 66.1671)
  line L286 (-297.6453, 66.1671) -> (-297.6453, 20.6671)
  line L287 (-297.6453, 20.6671) -> (-222.6453, 20.6671)
  line L288 (-222.6453, 20.6671) -> (-222.6453, 66.1671)
  circle A134 centre (-212.6453, 68.6671) radius 1.5
  line L289 (-222.6453, -24.8329) -> (-297.6453, -24.8329)
  line L290 (-297.6453, -24.8329) -> (-297.6453, 20.6671)
  circle A135 centre (-282.6453, 40.6671) radius 1.5
  circle A136 centre (-242.6453, 0.6671) radius 1.5
  line L291 (-237.6453, 45.6671) -> (-287.6453, -4.3329)
  line L292 (-287.6453, 45.6671) -> (-237.6453, -4.3329)
  line L293 (-292.6453, 50.6671) -> (-292.6453, 66.1671)
  line L294 (-222.6453, 56.1671) -> (-292.6453, 56.1671)
  line L295 (-292.6453, -9.3329) -> (-292.6453, -24.8329)
  line L296 (-292.6453, -9.3329) -> (-292.6453, 20.6671)
  line L297 (-222.6453, -14.8329) -> (-292.6453, -14.8329)
  line L298 (-287.6453, 45.6671) -> (-292.6453, 50.6671)
  line L299 (-237.6453, 45.6671) -> (-232.6453, 50.6671)
  line L300 (-237.6453, -4.3329) -> (-232.6453, -9.3329)
  line L301 (-287.6453, -4.3329) -> (-292.6453, -9.3329)
  line L302 (-235.678, -13.3713) -> (-241.1808, -7.8684)
  line L303 (-241.1808, -7.8684) -> (-291.1808, 42.1316)
  line L304 (-291.1808, 42.1316) -> (-297.6453, 48.596)
  line L305 (-297.6453, 48.596) -> (-297.6453, 66.1671)
  line L306 (-296.1808, -5.7973) -> (-291.1808, -0.7973)
  line L307 (-291.1808, -0.7973) -> (-241.1808, 49.2027)
  line L308 (-241.1808, 49.2027) -> (-236.1809, 54.2025)
  line L309 (-297.6453, -19.8329) -> (-208.1792, -19.8329) construction
  line L310 (-229.6126, -5.2945) -> (-234.1097, -0.7973)
  line L311 (-234.1097, -0.7973) -> (-284.1097, 49.2027)
  line L312 (-284.1097, 49.2027) -> (-287.6453, 52.7382)
  line L313 (-287.6453, 52.7382) -> (-287.6453, 66.1671)
  line L314 (-289.1097, -12.8684) -> (-284.1097, -7.8684)
  line L315 (-284.1097, -7.8684) -> (-234.1097, 42.1316)
  line L316 (-234.1097, 42.1316) -> (-229.1097, 47.1316)
  line L317 (-232.6453, 66.1671) -> (-232.6453, -19.8329)
  line L318 (-229.1097, 47.1316) -> (-232.6453, 43.596)
  line L319 (-236.1809, 54.2025) -> (-234.2163, 56.1671)
  line L320 (-287.6453, 52.7382) -> (-291.0742, 56.1671)
  line L321 (-289.1097, -12.8684) -> (-291.0742, -14.8329)
  line L322 (-229.6126, -5.2945) -> (-232.6453, -2.2618)
  line L323 (-235.678, -13.3713) -> (-234.2163, -14.8329)
  circle A137 centre (-227.6453, 61.1671) radius 5
  circle A138 centre (-227.6453, 61.1671) radius 1.6
  circle A139 centre (-227.6453, -19.8329) radius 1.6
  point P0 (0, 0)
  point P1 (-49.0948, 52.5578)
  point P2 (-36.6854, 54.8855)
  point P3 (-57.6453, 20.6671)
  point P4 (-149.6453, 325.6671)
  point P5 (-202.6453, 114.4295)
  point P6 (-69.1428, 20.6671)
  point P7 (397.3547, 45.6671)
  point P8 (387.3547, 55.6671)
  point P9 (-292.6453, 43.596)
  point P10 (-269.7163, 20.6671)
  point P11 (-292.6453, -2.2618)
  point P12 (-262.6453, 27.7382)
  point P13 (-255.5742, 20.6671)
  point P14 (-232.6453, 43.596)
  point P15 (-262.6453, 13.596)
  point P16 (-232.6453, 56.1671)
  point P17 (-232.6453, -14.8329)
  dimension "d0" = 3
  dimension "d1" = 5
  dimension "d2" = 5
  dimension "d3" = 3
  dimension "d4" = 5
  dimension "d5" = 5
  dimension "d6" = 10
  dimension "d7" = 5
  dimension "d8" = 5
  dimension "d9" = 5
  dimension "d10" = 5
  dimension "d11" = 10
  dimension "d12" = 10
  dimension "d13" = 3.2
extrude "押し出し1" add sketch "スケッチ1" against normal blind 5 contours L286 L304 L25 L14 | L14 L296 L295 L289 L290 | L286 L22 L25 L304 | L286 L285 L293 L22 | L295 L297 L3 L289 | L293 L285 L313 L294 | L3 A137 L285 | L297 L317 L14 L3 | L285 L317 L294 L313 | A137 | L3 L294 A137 | A137 L317 L285 | L14 L317 L22 L3 | L317 L294 L3 L22 | L294 L317 A137
fillet "フィレット1" radius 2 8 edges at (-2.5, -297.6453, 66.1671) (-2.5, -222.6453, 66.1671) (-2.5, -222.6453, -24.8329) (-2.5, -297.6453, -24.8329) (-2.5, -292.6453, -14.8329) (-2.5, -232.6453, -14.8329) (-2.5, -232.6453, 56.1671) (-2.5, -292.6453, 56.1671)
equation "\"d2\" = d1"
equation "\"d5\" = d4"
properties part number "base_weel-v2-Plate-6" material "アルミニウム 6061"
